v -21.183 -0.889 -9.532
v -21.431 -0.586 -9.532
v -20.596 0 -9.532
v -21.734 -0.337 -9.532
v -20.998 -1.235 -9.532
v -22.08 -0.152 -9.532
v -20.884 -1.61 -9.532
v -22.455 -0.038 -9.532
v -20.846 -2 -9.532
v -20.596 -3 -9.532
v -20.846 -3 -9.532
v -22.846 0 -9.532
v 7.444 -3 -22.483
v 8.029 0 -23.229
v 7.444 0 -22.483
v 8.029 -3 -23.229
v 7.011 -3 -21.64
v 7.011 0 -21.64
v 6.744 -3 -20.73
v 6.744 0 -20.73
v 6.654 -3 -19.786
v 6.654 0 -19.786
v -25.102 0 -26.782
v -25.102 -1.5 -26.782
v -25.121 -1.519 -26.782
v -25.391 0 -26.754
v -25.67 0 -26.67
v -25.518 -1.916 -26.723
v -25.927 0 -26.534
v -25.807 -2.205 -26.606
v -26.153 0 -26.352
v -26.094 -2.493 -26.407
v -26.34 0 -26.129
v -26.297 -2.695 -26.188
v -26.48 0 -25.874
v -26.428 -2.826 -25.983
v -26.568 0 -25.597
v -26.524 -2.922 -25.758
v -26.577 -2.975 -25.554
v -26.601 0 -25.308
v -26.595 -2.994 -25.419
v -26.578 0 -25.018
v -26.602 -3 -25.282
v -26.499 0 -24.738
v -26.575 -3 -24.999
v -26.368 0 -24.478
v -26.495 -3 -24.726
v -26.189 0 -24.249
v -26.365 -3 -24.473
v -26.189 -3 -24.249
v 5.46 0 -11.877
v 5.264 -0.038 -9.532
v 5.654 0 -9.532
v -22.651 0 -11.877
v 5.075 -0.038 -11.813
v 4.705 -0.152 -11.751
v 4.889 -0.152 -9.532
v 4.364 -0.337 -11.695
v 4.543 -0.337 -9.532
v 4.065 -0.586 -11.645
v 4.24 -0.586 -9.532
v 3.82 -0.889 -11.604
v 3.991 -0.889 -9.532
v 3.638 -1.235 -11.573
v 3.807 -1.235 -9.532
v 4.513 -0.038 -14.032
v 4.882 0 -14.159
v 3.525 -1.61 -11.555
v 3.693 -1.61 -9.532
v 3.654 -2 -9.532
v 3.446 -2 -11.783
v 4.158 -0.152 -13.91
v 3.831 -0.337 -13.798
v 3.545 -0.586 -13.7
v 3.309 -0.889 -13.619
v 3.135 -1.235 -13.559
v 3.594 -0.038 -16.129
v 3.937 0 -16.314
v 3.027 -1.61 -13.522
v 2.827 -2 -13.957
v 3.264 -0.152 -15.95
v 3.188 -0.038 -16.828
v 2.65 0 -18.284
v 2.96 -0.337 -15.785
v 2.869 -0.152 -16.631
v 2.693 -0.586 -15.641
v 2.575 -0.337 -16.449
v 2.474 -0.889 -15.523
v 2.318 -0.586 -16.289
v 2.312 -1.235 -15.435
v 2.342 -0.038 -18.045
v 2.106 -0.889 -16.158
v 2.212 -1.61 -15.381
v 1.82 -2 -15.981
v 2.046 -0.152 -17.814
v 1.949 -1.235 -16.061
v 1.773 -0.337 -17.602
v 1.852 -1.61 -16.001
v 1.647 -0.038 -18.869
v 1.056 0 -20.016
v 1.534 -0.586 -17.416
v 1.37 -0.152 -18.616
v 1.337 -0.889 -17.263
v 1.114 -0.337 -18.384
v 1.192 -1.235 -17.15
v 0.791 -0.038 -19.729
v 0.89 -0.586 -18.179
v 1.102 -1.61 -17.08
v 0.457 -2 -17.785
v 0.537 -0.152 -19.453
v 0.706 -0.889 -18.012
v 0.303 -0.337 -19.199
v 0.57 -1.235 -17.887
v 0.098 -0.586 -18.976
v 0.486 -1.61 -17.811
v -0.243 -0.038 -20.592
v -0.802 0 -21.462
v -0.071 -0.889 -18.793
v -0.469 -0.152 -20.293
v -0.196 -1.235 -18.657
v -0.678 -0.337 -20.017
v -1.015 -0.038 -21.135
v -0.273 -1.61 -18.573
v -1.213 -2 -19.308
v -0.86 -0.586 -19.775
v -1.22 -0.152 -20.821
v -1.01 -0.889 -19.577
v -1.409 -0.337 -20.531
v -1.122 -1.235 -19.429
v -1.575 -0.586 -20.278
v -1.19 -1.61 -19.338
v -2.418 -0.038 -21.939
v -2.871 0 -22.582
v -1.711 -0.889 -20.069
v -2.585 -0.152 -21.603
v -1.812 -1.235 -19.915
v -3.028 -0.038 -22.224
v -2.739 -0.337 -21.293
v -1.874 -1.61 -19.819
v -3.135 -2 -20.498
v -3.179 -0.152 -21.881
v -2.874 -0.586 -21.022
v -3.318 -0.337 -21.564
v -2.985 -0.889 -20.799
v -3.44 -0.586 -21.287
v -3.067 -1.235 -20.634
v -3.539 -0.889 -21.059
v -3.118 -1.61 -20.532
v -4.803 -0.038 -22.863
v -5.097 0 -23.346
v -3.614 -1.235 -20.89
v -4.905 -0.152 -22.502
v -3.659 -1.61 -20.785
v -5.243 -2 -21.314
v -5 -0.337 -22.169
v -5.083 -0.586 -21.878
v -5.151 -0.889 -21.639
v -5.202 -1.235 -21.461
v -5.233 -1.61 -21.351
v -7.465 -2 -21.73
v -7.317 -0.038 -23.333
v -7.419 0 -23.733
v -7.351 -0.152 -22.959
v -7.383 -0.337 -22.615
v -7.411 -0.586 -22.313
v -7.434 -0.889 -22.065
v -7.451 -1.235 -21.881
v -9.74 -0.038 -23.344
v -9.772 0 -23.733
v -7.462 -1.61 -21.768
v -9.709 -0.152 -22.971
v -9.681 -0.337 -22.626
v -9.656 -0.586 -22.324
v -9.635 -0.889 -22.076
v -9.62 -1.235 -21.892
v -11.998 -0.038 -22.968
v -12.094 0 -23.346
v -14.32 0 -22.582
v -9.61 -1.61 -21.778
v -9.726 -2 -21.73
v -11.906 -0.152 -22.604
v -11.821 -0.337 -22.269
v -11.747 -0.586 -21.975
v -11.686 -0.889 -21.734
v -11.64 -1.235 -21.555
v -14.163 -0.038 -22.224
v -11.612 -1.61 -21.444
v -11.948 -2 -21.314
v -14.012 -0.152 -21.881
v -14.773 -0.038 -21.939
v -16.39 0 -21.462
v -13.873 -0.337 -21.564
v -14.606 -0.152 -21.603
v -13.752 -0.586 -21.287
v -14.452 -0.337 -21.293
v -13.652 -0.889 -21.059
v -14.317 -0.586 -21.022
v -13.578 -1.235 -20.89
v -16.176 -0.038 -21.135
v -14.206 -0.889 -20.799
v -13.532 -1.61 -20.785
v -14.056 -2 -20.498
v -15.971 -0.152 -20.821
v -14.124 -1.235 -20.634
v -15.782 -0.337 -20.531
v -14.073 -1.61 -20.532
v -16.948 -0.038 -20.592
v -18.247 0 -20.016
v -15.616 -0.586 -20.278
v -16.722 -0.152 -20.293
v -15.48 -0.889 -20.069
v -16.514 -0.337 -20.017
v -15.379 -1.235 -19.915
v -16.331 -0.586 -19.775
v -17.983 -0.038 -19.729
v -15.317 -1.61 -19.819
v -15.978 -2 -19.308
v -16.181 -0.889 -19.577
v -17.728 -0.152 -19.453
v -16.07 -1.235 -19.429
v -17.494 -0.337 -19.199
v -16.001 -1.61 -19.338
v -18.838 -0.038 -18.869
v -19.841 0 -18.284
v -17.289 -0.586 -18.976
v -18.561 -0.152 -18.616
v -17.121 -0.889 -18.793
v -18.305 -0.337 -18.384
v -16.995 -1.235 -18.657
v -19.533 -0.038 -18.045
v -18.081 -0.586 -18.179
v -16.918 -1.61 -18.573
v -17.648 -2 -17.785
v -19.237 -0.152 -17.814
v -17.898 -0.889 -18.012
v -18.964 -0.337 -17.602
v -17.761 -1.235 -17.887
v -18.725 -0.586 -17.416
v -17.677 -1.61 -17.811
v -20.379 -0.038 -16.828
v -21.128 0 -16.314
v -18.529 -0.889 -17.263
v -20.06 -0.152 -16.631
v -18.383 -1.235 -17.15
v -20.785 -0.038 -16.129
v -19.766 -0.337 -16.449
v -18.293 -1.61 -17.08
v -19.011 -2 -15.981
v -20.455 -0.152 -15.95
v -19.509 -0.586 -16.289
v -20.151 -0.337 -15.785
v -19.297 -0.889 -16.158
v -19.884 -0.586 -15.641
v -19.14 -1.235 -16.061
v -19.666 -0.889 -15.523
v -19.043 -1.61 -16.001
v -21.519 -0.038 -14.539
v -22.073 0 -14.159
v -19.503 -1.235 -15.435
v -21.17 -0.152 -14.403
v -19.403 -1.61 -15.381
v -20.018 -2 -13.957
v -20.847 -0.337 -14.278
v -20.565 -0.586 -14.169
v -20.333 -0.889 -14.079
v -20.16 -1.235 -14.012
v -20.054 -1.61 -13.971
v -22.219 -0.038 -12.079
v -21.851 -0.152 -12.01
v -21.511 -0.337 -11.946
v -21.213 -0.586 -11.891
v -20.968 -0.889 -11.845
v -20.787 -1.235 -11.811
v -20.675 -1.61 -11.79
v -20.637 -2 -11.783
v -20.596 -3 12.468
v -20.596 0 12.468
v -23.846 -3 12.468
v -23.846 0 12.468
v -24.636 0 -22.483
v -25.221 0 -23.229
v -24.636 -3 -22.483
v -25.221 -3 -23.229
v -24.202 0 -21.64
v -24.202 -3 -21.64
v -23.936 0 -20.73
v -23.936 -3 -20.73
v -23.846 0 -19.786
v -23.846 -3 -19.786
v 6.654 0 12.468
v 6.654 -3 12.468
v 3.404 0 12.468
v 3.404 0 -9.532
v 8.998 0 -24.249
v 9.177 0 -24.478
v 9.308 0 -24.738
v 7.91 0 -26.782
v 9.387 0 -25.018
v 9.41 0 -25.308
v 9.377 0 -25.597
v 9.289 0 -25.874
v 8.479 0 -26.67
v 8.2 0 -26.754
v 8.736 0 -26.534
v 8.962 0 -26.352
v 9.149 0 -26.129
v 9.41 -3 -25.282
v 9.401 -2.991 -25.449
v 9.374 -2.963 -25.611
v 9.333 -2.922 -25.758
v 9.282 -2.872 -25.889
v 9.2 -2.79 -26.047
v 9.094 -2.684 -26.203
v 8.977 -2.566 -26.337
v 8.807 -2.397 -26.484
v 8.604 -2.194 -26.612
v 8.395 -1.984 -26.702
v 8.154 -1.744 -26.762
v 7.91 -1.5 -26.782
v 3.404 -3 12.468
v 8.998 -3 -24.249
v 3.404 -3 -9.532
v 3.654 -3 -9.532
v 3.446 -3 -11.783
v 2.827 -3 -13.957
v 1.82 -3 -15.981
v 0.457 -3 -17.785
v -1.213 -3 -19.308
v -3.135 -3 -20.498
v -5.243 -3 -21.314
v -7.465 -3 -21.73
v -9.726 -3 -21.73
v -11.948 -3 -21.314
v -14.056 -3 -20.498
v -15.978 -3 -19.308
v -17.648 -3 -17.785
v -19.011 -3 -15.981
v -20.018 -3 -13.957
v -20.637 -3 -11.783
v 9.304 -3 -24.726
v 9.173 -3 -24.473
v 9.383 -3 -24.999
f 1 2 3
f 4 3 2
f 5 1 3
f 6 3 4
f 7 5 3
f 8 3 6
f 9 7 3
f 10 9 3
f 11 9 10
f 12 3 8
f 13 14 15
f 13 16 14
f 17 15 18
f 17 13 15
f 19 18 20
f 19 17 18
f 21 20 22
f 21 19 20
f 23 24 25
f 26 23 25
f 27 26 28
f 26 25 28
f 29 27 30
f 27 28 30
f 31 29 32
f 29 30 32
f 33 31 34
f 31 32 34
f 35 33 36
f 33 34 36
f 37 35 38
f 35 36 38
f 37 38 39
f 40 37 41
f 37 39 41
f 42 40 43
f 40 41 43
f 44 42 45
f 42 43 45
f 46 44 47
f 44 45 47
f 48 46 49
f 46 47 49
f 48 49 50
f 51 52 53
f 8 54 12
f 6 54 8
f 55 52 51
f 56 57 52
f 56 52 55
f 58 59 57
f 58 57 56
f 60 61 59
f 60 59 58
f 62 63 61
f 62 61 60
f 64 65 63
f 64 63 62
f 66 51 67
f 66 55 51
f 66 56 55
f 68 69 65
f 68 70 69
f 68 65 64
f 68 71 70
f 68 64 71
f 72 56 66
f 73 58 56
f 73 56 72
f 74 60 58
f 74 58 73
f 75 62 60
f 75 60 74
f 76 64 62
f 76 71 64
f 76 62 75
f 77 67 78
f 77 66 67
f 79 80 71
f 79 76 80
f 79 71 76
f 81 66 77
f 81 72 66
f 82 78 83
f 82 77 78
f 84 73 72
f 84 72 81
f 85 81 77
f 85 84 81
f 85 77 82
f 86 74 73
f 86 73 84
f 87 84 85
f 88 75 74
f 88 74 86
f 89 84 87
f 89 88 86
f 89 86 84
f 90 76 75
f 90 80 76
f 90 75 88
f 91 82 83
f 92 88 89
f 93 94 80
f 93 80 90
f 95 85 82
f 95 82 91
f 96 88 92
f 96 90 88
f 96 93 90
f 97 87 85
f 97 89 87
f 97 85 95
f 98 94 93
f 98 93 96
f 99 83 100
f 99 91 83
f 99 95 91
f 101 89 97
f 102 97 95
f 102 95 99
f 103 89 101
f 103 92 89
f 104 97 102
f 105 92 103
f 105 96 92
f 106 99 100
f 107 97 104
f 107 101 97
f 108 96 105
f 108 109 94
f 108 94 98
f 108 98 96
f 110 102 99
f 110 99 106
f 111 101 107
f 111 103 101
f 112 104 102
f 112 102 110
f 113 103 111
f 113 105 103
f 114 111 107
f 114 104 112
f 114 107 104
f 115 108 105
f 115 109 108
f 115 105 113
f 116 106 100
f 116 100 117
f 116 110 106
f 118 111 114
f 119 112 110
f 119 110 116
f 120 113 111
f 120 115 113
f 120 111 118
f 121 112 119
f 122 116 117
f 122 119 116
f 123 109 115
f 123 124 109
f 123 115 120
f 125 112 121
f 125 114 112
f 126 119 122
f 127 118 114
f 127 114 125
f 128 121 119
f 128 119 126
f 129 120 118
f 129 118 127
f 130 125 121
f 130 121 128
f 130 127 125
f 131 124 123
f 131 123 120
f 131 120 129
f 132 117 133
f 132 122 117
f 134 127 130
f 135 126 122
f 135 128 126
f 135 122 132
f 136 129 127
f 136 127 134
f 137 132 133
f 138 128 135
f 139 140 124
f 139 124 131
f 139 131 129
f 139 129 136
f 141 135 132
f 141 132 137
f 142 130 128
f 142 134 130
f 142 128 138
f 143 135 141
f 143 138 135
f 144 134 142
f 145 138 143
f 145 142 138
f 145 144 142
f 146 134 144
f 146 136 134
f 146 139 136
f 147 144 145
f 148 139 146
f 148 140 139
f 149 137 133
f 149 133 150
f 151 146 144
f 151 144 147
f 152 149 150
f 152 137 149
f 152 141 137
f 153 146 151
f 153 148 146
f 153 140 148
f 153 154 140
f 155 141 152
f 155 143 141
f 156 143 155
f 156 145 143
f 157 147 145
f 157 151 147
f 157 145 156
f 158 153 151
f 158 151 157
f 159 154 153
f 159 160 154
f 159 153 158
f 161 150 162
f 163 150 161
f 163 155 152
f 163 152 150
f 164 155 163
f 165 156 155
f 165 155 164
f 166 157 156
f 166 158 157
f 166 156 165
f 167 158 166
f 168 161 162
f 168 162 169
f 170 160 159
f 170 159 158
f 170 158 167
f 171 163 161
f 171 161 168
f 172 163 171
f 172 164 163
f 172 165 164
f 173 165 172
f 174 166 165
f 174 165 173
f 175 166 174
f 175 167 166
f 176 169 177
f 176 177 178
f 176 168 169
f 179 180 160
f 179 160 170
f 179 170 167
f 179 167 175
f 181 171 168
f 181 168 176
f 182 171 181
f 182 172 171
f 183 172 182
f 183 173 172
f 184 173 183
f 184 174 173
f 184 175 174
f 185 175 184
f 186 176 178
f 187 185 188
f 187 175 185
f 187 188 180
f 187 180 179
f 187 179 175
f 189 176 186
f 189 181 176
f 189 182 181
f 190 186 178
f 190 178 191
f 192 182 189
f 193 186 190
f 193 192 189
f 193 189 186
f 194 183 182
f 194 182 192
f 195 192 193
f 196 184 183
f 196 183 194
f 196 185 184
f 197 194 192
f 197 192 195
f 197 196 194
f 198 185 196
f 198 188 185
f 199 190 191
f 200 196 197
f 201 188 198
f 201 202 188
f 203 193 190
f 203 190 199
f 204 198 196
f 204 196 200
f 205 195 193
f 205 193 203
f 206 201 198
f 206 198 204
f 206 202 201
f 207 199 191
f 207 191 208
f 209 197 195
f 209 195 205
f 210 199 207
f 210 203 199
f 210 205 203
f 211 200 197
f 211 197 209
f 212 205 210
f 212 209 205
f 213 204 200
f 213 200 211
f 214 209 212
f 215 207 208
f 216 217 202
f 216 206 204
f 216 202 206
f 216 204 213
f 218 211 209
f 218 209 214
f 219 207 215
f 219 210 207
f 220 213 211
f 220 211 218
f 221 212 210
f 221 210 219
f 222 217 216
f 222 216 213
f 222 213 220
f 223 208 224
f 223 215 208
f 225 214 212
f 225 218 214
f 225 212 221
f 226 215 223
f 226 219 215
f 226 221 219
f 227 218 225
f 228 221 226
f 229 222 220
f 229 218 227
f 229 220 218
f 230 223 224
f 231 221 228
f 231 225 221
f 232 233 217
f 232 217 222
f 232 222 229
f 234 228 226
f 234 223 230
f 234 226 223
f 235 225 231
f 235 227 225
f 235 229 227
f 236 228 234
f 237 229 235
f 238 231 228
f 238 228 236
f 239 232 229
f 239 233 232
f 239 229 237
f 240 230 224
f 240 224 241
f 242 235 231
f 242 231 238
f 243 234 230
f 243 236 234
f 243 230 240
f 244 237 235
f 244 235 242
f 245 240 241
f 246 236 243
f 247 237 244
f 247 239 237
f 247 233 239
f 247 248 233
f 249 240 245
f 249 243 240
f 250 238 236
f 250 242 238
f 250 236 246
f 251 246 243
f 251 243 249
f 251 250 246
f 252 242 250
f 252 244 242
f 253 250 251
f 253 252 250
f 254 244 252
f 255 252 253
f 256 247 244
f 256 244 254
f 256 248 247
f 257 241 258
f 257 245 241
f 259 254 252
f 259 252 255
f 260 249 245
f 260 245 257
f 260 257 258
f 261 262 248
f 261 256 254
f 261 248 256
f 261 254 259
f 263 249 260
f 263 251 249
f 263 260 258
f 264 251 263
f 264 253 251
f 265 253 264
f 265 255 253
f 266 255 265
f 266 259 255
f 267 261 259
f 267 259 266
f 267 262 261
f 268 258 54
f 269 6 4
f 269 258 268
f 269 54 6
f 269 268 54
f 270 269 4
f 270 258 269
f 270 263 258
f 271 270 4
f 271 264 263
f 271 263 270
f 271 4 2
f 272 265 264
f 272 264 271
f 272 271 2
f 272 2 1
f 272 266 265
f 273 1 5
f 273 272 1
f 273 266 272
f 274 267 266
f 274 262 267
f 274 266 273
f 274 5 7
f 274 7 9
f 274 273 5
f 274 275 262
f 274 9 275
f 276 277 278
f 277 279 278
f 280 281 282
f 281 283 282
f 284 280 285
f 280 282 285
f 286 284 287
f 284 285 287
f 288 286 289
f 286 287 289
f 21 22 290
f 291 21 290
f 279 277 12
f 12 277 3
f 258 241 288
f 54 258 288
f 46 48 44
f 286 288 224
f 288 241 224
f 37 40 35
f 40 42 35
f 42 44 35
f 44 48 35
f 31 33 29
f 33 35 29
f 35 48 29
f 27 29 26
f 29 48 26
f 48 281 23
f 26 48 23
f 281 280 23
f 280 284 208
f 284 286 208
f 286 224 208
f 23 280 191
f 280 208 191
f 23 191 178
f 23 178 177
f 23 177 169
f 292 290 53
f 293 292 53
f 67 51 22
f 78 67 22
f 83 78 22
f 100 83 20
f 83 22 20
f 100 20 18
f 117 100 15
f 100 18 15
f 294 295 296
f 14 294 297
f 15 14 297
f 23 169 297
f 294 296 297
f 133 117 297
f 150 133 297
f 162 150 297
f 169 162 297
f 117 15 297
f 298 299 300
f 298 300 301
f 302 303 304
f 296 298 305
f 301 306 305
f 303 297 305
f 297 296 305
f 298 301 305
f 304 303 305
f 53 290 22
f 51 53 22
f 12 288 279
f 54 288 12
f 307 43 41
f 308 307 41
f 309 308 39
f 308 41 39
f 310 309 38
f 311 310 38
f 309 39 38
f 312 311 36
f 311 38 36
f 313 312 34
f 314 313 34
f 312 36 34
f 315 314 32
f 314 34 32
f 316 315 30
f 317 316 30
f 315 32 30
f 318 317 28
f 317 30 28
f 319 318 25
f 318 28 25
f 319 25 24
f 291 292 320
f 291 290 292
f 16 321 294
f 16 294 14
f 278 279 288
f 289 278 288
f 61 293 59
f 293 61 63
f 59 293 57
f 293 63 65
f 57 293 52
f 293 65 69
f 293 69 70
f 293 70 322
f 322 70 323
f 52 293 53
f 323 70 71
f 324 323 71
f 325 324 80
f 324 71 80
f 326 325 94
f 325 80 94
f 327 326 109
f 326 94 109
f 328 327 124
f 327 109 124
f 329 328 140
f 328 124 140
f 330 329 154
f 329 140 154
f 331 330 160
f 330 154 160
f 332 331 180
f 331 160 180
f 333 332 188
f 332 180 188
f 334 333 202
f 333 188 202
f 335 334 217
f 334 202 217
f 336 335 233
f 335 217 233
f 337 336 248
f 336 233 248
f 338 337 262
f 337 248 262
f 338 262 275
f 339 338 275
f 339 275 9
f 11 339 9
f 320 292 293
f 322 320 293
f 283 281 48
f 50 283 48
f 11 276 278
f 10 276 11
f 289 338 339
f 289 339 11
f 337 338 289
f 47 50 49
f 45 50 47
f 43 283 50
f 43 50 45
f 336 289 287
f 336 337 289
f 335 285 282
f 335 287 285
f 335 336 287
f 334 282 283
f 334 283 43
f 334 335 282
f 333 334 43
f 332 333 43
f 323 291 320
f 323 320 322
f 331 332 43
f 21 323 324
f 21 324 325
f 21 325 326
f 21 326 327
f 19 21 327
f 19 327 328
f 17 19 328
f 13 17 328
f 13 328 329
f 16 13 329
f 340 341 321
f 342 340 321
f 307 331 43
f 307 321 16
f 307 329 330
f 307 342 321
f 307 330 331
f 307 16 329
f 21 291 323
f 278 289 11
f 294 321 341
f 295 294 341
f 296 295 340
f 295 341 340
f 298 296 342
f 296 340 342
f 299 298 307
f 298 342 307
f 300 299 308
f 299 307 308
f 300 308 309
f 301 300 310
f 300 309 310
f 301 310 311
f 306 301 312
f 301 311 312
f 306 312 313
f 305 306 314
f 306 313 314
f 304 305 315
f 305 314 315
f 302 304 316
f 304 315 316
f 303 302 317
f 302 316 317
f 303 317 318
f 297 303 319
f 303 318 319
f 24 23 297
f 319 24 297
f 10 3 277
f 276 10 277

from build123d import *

# Parameters (mm, degrees)
F1_DEPTH    = 3
F2_DEPTH    = 0.25
F3_DEPTH    = 0.25
F4_R        = 2
F5_R        = 1.5
F6_R        = 5
F7_T1_DEPTH = 40.5120657328


# Not quite as in the source:
# - a fillet or chamfer that OpenCascade refuses, or shapes differently, is made with other operations: its cross-section is extruded or revolved along the edge and cut away or added


with BuildPart() as f1:
    # F0 (on Front) → F1 (new body)
    with BuildSketch(Plane.XZ):
        with BuildLine():
            ThreePointArc((3.6544098407, -9.5319570974), (-8.5955901593, -21.7819570974), (-20.8455901593, -9.5319570974))
            Line((-20.8455901593, -9.5319570974), (-20.8455901593, 12.4680429026))
            Line((-20.8455901593, 12.4680429026), (-23.8455901593, 12.4680429026))
            Line((-23.8455901593, 12.4680429026), (-23.8455901593, -9.5319570974))
            Line((-23.8455901593, -9.5319570974), (-23.8455901593, -21.7819570974))
            Line((-23.8455901593, -21.7819570974), (-28.5955901593, -26.7819570974))
            Line((-28.5955901593, -26.7819570974), (-8.5955901593, -26.7819570974))
            Line((-8.5955901593, -26.7819570974), (11.4044098407, -26.7819570974))
            Line((11.4044098407, -26.7819570974), (6.6544098407, -21.7819570974))
            Line((6.6544098407, -21.7819570974), (6.6544098407, 12.4680429026))
            Line((6.6544098407, 12.4680429026), (3.6544098407, 12.4680429026))
            Line((3.6544098407, 12.4680429026), (3.6544098407, -9.5319570974))
        make_face()
    extrude(amount=F1_DEPTH)

    # F2 (add): a face of the model
    f2_faces = [f1.faces().sort_by_distance(p)[0] for p in [
        (-20.8455901593, -1.5, 1.4680429026),
    ]]
    extrude(f2_faces, amount=F2_DEPTH)

    # F3 (add): a face of the model
    f3_faces = [f1.faces().sort_by_distance(p)[0] for p in [
        (3.6544098407, -1.5, 1.4680429026),
    ]]
    extrude(f3_faces, amount=F3_DEPTH)

    # F4
    f4_edges = [f1.edges().sort_by_distance(p)[0] for p in [
        (-8.59559, 0, -21.781957),
    ]]
    fillet(f4_edges, radius=F4_R)

    # F5
    f5_edges = [f1.edges().sort_by_distance(p)[0] for p in [
        (11.40441, -1.5, -26.781957),
        (-28.59559, -1.5, -26.781957),
    ]]
    fillet(f5_edges, radius=F5_R)

    # F6
    f6_edges = [f1.edges().sort_by_distance(p)[0] for p in [
        (-23.84559, -1.5, -21.781957),
        (6.65441, -1.5, -21.781957),
    ]]
    fillet(f6_edges, radius=F6_R)

    # F7: fillet of radius 1.5 on 1 edges, made by hand

    # F7_s2 → F7_t1 (cut)
    with BuildSketch(Plane.YZ.offset(-28.8516230257)):
        with BuildLine():
            ThreePointArc((-3, -25.2819570974), (-2.5606601718, -26.3426172691), (-1.5, -26.7819570974))
            Line((-1.5, -26.7819570974), (-3, -26.7819570974))
            Line((-3, -26.7819570974), (-3, -25.2819570974))
        make_face()
    extrude(amount=F7_T1_DEPTH, mode=Mode.SUBTRACT)


solid = f1.part
